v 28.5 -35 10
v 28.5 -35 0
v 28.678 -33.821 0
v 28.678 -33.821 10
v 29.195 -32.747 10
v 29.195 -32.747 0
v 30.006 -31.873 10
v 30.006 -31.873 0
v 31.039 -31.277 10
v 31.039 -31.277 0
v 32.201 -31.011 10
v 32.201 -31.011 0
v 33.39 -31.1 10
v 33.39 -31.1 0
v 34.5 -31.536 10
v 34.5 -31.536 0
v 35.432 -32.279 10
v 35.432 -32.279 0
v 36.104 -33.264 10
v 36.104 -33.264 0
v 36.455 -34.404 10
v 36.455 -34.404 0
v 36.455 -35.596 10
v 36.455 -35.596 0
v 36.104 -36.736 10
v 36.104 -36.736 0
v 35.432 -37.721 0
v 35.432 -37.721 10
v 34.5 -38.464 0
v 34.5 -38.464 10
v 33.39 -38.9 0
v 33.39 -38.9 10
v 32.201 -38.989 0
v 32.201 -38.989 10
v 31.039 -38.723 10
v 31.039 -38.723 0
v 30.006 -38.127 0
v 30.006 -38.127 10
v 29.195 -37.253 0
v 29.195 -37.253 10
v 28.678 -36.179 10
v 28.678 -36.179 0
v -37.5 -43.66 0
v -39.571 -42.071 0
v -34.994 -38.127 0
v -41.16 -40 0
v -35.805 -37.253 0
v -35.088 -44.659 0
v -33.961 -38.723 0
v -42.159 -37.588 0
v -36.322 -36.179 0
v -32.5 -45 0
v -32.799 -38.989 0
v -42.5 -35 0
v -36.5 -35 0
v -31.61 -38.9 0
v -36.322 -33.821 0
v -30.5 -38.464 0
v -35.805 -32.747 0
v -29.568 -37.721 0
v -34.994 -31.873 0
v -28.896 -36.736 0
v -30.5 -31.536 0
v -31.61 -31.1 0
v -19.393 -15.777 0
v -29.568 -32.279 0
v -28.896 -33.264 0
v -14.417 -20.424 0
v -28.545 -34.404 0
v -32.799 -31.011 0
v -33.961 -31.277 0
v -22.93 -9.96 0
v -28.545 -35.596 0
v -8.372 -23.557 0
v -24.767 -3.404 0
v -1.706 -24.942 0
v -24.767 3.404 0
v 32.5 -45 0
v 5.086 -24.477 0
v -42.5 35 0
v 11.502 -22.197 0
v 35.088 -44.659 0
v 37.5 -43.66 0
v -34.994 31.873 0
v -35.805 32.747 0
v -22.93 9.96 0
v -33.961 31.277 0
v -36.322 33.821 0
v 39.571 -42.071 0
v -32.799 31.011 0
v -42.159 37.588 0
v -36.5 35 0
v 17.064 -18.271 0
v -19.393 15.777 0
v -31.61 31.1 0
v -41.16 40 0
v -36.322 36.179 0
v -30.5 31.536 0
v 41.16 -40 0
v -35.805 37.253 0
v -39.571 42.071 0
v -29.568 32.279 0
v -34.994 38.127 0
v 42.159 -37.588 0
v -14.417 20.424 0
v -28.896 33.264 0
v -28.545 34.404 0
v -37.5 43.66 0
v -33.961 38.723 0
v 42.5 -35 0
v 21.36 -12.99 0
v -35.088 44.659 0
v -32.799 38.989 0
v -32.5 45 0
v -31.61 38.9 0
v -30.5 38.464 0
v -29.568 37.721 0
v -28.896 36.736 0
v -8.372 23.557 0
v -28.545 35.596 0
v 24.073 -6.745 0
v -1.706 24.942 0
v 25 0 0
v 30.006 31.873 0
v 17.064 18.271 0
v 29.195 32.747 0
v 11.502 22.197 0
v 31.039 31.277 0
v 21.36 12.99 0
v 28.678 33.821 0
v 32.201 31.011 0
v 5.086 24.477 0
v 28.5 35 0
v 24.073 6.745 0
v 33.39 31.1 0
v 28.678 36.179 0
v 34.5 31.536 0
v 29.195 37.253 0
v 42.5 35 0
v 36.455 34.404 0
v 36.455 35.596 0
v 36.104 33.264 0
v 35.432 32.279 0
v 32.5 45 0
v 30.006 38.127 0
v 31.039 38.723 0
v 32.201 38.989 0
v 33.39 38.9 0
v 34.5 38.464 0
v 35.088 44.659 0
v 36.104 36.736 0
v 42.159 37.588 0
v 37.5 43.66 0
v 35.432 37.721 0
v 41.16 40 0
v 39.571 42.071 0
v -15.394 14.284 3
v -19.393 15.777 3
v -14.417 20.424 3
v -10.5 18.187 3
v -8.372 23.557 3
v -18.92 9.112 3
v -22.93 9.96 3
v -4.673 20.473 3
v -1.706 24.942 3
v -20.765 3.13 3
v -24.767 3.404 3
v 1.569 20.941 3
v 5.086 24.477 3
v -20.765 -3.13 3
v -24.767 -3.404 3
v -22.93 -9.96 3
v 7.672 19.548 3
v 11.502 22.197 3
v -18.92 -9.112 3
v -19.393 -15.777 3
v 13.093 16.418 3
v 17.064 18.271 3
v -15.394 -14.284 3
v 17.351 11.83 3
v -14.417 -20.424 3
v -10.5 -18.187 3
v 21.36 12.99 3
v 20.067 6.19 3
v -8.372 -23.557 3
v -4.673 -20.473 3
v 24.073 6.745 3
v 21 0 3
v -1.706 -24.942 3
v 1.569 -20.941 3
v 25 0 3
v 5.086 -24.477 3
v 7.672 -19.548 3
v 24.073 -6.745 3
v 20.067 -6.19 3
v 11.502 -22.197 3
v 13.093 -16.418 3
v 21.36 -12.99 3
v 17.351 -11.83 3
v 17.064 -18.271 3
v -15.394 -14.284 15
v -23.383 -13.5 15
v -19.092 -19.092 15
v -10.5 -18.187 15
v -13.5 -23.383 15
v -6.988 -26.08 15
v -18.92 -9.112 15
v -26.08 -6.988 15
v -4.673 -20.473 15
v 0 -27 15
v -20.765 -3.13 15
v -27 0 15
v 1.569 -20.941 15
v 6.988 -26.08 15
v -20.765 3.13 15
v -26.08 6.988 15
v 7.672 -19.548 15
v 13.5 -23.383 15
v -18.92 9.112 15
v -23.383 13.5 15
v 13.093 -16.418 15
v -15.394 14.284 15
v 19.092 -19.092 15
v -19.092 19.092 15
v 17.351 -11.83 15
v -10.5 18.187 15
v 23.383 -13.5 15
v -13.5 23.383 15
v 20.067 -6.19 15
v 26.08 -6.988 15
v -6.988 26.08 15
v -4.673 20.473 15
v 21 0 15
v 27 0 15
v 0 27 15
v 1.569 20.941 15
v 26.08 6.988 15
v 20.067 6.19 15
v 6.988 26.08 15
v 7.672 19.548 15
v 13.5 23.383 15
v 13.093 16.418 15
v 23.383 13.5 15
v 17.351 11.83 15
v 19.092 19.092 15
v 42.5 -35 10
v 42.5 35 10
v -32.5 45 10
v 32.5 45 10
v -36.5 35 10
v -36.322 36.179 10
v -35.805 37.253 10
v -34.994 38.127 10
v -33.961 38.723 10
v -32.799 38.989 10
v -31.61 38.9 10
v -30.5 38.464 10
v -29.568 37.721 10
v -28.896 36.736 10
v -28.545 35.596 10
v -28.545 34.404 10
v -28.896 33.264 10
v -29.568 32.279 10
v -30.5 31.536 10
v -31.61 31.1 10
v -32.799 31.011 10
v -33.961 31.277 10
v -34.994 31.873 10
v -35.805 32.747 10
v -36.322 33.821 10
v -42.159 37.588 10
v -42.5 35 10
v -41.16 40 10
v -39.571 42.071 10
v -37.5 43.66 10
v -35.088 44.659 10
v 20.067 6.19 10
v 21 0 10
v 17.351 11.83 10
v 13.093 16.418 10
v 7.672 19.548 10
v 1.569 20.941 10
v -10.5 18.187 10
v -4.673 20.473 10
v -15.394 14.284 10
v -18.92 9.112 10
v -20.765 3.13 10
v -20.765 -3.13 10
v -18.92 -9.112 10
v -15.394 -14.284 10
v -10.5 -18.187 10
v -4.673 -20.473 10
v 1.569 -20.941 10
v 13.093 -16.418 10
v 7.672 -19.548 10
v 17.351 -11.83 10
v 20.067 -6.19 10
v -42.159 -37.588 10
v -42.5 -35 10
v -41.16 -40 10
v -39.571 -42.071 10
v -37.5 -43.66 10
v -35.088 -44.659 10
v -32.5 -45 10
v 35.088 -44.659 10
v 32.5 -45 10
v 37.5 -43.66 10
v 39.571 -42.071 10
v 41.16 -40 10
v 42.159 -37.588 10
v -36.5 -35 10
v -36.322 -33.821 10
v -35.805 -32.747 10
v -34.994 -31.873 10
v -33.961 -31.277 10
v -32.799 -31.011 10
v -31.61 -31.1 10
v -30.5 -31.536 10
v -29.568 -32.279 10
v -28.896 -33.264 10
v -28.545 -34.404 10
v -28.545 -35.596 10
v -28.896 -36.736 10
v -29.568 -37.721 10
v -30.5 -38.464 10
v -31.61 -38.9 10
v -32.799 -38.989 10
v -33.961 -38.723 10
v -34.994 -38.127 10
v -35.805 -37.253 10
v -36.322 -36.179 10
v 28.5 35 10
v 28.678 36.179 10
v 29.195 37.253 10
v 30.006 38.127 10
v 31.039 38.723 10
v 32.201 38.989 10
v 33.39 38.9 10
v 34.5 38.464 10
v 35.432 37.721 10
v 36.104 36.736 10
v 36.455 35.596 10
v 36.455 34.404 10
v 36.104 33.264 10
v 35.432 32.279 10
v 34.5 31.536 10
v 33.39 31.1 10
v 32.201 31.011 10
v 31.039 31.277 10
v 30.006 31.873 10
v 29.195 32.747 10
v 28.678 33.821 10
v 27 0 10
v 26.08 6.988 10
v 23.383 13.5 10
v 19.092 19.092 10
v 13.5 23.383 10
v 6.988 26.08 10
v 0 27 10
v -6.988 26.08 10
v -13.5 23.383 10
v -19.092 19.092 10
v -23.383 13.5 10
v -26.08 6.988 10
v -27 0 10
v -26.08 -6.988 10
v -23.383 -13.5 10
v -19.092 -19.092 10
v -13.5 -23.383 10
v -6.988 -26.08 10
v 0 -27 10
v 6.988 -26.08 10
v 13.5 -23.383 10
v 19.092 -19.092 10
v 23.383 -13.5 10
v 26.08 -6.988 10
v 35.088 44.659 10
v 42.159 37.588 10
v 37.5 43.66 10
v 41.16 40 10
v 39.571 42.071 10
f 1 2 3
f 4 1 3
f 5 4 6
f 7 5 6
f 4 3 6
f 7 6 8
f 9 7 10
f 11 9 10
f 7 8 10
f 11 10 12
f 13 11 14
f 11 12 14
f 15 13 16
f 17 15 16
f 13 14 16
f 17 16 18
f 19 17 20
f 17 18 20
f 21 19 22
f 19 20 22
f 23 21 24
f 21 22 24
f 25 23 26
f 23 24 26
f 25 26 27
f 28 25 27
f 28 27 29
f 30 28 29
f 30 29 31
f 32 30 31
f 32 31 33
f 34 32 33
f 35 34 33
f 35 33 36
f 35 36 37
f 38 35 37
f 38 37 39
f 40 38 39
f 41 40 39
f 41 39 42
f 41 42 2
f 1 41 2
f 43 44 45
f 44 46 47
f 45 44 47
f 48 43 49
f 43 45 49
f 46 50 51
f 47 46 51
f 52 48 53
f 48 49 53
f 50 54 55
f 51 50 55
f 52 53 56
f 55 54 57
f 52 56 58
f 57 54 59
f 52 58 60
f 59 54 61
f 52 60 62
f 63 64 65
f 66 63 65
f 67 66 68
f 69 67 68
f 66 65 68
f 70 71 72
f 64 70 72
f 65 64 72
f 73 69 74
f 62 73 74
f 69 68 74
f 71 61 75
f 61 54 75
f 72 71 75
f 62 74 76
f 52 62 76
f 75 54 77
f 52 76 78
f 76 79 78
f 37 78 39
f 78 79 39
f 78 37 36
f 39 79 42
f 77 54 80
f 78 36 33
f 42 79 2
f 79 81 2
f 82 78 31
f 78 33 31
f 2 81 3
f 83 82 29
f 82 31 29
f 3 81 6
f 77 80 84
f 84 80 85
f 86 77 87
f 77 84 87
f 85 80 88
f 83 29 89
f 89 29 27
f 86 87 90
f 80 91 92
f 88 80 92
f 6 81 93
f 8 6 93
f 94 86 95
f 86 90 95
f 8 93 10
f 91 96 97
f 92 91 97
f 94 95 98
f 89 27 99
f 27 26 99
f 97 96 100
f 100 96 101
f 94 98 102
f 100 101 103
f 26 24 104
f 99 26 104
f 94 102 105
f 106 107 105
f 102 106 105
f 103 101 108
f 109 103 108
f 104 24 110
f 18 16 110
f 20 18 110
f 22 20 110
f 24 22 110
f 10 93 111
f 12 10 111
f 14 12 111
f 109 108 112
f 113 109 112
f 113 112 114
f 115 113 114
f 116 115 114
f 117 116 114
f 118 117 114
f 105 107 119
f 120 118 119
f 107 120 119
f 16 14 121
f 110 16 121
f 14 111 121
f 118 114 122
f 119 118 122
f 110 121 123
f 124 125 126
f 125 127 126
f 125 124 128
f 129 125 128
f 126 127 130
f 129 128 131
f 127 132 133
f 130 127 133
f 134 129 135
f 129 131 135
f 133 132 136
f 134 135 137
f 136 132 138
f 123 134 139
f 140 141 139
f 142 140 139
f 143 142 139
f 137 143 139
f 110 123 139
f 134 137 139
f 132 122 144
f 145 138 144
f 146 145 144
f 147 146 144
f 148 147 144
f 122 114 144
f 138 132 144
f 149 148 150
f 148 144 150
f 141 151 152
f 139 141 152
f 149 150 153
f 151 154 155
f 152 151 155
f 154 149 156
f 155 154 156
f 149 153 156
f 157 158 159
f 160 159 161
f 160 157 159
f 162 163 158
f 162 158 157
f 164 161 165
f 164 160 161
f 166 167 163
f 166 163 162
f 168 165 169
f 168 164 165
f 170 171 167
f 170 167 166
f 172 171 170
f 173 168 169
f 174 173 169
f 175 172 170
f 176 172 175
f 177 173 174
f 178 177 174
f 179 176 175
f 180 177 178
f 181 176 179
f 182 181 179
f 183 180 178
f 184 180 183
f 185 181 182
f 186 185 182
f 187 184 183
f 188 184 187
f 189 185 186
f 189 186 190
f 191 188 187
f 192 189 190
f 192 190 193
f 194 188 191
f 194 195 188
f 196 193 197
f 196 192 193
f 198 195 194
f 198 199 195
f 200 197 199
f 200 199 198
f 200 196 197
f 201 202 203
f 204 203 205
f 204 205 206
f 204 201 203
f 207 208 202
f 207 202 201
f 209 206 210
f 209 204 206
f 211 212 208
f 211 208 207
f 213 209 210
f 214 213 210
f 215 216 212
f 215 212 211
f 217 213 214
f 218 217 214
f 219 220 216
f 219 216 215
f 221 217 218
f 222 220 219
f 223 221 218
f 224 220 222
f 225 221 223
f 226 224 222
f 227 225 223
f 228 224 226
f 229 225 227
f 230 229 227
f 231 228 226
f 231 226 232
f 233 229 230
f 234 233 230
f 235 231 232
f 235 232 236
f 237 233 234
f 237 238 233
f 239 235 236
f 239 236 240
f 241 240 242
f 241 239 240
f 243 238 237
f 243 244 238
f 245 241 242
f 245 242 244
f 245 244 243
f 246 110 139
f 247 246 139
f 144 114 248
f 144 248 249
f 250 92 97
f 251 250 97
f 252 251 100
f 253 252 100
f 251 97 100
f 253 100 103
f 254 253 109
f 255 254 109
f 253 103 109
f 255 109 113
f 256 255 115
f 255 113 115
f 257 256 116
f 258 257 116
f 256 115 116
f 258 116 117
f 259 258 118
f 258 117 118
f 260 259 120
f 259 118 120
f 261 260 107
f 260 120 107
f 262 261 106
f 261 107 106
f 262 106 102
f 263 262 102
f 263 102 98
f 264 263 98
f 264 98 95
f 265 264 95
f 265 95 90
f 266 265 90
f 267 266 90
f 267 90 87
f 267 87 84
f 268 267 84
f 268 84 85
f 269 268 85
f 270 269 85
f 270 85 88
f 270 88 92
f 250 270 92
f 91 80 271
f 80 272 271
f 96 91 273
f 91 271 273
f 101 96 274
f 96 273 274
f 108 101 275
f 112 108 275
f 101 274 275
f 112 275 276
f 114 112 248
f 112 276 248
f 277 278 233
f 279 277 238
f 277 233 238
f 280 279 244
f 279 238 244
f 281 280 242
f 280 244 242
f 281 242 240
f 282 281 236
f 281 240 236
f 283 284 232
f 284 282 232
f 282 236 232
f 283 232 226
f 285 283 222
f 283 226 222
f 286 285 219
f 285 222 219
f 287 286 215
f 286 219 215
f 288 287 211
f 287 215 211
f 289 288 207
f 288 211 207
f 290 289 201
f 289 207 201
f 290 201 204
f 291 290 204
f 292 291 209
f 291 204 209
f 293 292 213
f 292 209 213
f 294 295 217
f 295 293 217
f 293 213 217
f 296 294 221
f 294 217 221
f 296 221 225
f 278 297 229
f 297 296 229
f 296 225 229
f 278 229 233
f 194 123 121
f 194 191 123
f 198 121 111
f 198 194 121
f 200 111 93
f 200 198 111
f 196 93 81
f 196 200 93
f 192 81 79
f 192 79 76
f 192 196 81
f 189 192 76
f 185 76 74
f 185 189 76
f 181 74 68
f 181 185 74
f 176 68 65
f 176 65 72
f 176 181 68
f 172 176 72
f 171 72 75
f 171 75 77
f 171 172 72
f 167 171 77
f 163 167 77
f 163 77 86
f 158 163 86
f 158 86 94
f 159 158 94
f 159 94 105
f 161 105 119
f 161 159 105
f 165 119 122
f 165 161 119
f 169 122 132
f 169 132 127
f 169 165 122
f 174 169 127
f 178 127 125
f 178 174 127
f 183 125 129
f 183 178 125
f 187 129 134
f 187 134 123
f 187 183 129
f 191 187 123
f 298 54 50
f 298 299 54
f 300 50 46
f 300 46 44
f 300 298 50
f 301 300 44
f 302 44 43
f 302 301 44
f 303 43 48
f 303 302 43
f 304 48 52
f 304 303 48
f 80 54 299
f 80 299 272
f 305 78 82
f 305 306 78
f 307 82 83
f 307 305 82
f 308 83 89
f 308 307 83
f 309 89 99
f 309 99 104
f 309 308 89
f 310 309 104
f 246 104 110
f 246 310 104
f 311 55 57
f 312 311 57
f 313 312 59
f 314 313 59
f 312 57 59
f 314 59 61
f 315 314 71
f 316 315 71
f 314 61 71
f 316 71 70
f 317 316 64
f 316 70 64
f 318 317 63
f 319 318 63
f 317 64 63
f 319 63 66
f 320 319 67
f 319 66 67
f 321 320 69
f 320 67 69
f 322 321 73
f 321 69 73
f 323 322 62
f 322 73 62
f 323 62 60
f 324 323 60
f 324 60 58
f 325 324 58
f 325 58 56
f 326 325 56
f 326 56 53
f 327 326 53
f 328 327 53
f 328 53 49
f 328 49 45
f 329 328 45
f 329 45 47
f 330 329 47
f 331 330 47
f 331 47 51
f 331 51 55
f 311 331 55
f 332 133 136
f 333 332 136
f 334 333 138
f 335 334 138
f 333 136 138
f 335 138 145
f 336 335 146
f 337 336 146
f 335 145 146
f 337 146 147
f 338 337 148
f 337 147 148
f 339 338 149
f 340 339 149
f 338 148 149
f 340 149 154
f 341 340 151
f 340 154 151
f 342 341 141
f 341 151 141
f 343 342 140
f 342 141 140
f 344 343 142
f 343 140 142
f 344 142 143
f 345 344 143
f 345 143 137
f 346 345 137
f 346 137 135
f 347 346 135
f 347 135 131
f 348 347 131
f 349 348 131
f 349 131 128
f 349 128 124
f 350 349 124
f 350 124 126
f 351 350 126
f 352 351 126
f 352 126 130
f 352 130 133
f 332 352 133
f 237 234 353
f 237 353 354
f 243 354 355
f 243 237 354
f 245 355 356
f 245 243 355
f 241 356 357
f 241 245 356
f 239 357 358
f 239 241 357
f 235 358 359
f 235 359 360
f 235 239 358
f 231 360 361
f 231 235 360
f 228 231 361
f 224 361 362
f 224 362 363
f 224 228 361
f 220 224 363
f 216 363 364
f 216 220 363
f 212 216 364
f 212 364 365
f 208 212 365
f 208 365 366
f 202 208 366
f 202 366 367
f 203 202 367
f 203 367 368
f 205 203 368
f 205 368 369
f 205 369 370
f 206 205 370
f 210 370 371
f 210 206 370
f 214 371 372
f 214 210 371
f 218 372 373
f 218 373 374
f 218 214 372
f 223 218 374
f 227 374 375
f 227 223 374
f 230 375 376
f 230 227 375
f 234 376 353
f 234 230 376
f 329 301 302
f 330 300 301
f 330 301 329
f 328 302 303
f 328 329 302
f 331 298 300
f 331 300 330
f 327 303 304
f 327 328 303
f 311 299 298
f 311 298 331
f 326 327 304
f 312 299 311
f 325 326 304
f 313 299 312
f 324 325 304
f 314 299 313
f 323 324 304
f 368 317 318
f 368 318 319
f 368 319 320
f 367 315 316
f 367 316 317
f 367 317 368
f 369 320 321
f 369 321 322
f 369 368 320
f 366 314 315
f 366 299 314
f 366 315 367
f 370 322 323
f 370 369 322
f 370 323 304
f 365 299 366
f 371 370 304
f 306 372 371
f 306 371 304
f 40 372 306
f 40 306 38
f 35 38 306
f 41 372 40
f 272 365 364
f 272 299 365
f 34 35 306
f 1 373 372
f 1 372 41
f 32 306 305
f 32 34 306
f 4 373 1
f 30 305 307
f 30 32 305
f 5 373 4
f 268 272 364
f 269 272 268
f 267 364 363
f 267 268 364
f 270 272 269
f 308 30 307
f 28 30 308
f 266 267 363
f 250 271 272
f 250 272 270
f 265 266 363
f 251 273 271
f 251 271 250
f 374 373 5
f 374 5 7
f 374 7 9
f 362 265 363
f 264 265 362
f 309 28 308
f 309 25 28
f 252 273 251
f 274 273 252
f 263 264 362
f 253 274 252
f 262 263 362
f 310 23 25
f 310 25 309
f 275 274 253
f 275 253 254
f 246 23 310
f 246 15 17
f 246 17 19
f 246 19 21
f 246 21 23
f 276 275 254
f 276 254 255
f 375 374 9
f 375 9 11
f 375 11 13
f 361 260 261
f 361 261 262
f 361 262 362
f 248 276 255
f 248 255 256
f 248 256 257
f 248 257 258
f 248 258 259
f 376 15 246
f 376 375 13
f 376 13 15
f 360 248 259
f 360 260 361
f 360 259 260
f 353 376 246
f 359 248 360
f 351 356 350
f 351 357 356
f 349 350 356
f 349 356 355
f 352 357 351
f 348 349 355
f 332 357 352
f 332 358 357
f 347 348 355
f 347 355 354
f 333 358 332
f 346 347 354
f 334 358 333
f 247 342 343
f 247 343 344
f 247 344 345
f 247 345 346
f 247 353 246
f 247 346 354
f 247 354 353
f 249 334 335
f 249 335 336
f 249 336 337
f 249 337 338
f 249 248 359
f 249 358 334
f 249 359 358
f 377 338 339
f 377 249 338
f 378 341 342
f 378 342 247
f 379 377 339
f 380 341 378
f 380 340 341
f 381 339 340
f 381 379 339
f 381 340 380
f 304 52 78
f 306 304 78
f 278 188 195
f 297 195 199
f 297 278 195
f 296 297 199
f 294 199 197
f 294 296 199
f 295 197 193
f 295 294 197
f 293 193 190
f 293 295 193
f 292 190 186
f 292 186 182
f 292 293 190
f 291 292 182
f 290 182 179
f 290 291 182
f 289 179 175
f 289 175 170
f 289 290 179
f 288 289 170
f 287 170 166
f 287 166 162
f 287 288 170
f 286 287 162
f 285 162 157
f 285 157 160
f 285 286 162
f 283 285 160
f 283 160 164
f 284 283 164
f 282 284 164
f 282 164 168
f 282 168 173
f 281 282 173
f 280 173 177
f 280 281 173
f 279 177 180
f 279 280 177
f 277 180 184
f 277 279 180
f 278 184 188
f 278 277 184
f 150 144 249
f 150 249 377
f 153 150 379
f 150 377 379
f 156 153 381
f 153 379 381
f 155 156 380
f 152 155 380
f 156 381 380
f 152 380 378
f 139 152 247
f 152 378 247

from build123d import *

# Parameters (mm, degrees)
SZKIC1_W                                             = 85
SZKIC1_H                                             = 90
DODANIE_WYCI_GNI_CIE1_DEPTH                          = 10
DODANIE_WYCI_GNI_CIE2_START                          = 5
SZKIC9_R                                             = 27
SZKIC9_R_2                                           = 21
DODANIE_WYCI_GNI_CIE2_DEPTH                          = 5
ZAOKR_GLENIE1_R                                      = 10
POG_BIENIE_STO_KOWE_POD_M6_WKR_T_USTALAJ_D           = 6.4
POG_BIENIE_STO_KOWE_POD_M6_WKR_T_USTALAJ_DEPTH       = 26
POG_BIENIE_STO_KOWE_POD_M6_WKR_T_USTALAJ_CSINK_D     = 13.44
POG_BIENIE_STO_KOWE_POD_M6_WKR_T_USTALAJ_CSINK_ANGLE = 90
POG_BIENIE_STO_KOWE_POD_M6_WKR_T_USTALAJ_TIP         = 1.922753981
SZKIC12_R                                            = 4
WYTNIJ_WYCI_GNI_CIE2_DEPTH                           = 64.688696014


with BuildPart() as part:
    # Szkic1 → Dodanie-wyciągnięcie1 (new body)
    with BuildSketch(Plane.XY):
        Rectangle(SZKIC1_W, SZKIC1_H)
    extrude(amount=DODANIE_WYCI_GNI_CIE1_DEPTH)

    # Szkic2 → Wycięcie-obrót1 (revolve, cut)
    with BuildSketch(Plane(origin=(0, 0, 0), x_dir=(1, 0, 0), z_dir=(0, 1, 0))):
        Polygon((0, 0), (25, 0), (25, -3), (21, -3), (21, -10), (0, -10), align=None)
    revolve(axis=Axis((0, 0, 0), (0, 0, -1)), mode=Mode.SUBTRACT)

    # Szkic9 → Dodanie-wyciągnięcie2 (add)
    with BuildSketch(Plane.XY.offset(10).offset(DODANIE_WYCI_GNI_CIE2_START)):
        Circle(SZKIC9_R)
        Circle(SZKIC9_R_2, mode=Mode.SUBTRACT)
    extrude(amount=-DODANIE_WYCI_GNI_CIE2_DEPTH)

    # Zaokrąglenie1
    zaokr_glenie1_edges = [part.edges().sort_by_distance(p)[0] for p in [
        (42.5, -45, 5),
        (-42.5, -45, 5),
        (-42.5, 45, 5),
        (42.5, 45, 5),
    ]]
    fillet(zaokr_glenie1_edges, radius=ZAOKR_GLENIE1_R)

    # Pogłębienie stożkowe pod M6 Wkręt ustalający1
    with Locations(Plane(origin=(267.5, 155, -16), x_dir=(1, 0, 0), z_dir=(0, 0, -1))):
        with Locations((-235, 190), (-235, 120), (-300, 120), (-300, 190)):
            CounterSinkHole(POG_BIENIE_STO_KOWE_POD_M6_WKR_T_USTALAJ_D / 2, POG_BIENIE_STO_KOWE_POD_M6_WKR_T_USTALAJ_CSINK_D / 2, depth=POG_BIENIE_STO_KOWE_POD_M6_WKR_T_USTALAJ_DEPTH, counter_sink_angle=POG_BIENIE_STO_KOWE_POD_M6_WKR_T_USTALAJ_CSINK_ANGLE)
            with Locations((0, 0, -(POG_BIENIE_STO_KOWE_POD_M6_WKR_T_USTALAJ_DEPTH + POG_BIENIE_STO_KOWE_POD_M6_WKR_T_USTALAJ_TIP / 2))):  # 118° drill point
                Cone(0, POG_BIENIE_STO_KOWE_POD_M6_WKR_T_USTALAJ_D / 2, POG_BIENIE_STO_KOWE_POD_M6_WKR_T_USTALAJ_TIP, mode=Mode.SUBTRACT)

    # Szkic12 → Wytnij-wyciągnięcie2 (cut, through all)
    with BuildSketch(Plane(origin=(0, 0, 0), x_dir=(-1, 0, 0), z_dir=(0, 0, -1))):
        with Locations((-32.5, 35)):
            Circle(SZKIC12_R)
        with Locations((32.5, 35)):
            Circle(SZKIC12_R)
        with Locations((32.5, -35)):
            Circle(SZKIC12_R)
        with Locations((-32.5, -35)):
            Circle(SZKIC12_R)
    extrude(amount=-WYTNIJ_WYCI_GNI_CIE2_DEPTH, mode=Mode.SUBTRACT)


solid = part.part
